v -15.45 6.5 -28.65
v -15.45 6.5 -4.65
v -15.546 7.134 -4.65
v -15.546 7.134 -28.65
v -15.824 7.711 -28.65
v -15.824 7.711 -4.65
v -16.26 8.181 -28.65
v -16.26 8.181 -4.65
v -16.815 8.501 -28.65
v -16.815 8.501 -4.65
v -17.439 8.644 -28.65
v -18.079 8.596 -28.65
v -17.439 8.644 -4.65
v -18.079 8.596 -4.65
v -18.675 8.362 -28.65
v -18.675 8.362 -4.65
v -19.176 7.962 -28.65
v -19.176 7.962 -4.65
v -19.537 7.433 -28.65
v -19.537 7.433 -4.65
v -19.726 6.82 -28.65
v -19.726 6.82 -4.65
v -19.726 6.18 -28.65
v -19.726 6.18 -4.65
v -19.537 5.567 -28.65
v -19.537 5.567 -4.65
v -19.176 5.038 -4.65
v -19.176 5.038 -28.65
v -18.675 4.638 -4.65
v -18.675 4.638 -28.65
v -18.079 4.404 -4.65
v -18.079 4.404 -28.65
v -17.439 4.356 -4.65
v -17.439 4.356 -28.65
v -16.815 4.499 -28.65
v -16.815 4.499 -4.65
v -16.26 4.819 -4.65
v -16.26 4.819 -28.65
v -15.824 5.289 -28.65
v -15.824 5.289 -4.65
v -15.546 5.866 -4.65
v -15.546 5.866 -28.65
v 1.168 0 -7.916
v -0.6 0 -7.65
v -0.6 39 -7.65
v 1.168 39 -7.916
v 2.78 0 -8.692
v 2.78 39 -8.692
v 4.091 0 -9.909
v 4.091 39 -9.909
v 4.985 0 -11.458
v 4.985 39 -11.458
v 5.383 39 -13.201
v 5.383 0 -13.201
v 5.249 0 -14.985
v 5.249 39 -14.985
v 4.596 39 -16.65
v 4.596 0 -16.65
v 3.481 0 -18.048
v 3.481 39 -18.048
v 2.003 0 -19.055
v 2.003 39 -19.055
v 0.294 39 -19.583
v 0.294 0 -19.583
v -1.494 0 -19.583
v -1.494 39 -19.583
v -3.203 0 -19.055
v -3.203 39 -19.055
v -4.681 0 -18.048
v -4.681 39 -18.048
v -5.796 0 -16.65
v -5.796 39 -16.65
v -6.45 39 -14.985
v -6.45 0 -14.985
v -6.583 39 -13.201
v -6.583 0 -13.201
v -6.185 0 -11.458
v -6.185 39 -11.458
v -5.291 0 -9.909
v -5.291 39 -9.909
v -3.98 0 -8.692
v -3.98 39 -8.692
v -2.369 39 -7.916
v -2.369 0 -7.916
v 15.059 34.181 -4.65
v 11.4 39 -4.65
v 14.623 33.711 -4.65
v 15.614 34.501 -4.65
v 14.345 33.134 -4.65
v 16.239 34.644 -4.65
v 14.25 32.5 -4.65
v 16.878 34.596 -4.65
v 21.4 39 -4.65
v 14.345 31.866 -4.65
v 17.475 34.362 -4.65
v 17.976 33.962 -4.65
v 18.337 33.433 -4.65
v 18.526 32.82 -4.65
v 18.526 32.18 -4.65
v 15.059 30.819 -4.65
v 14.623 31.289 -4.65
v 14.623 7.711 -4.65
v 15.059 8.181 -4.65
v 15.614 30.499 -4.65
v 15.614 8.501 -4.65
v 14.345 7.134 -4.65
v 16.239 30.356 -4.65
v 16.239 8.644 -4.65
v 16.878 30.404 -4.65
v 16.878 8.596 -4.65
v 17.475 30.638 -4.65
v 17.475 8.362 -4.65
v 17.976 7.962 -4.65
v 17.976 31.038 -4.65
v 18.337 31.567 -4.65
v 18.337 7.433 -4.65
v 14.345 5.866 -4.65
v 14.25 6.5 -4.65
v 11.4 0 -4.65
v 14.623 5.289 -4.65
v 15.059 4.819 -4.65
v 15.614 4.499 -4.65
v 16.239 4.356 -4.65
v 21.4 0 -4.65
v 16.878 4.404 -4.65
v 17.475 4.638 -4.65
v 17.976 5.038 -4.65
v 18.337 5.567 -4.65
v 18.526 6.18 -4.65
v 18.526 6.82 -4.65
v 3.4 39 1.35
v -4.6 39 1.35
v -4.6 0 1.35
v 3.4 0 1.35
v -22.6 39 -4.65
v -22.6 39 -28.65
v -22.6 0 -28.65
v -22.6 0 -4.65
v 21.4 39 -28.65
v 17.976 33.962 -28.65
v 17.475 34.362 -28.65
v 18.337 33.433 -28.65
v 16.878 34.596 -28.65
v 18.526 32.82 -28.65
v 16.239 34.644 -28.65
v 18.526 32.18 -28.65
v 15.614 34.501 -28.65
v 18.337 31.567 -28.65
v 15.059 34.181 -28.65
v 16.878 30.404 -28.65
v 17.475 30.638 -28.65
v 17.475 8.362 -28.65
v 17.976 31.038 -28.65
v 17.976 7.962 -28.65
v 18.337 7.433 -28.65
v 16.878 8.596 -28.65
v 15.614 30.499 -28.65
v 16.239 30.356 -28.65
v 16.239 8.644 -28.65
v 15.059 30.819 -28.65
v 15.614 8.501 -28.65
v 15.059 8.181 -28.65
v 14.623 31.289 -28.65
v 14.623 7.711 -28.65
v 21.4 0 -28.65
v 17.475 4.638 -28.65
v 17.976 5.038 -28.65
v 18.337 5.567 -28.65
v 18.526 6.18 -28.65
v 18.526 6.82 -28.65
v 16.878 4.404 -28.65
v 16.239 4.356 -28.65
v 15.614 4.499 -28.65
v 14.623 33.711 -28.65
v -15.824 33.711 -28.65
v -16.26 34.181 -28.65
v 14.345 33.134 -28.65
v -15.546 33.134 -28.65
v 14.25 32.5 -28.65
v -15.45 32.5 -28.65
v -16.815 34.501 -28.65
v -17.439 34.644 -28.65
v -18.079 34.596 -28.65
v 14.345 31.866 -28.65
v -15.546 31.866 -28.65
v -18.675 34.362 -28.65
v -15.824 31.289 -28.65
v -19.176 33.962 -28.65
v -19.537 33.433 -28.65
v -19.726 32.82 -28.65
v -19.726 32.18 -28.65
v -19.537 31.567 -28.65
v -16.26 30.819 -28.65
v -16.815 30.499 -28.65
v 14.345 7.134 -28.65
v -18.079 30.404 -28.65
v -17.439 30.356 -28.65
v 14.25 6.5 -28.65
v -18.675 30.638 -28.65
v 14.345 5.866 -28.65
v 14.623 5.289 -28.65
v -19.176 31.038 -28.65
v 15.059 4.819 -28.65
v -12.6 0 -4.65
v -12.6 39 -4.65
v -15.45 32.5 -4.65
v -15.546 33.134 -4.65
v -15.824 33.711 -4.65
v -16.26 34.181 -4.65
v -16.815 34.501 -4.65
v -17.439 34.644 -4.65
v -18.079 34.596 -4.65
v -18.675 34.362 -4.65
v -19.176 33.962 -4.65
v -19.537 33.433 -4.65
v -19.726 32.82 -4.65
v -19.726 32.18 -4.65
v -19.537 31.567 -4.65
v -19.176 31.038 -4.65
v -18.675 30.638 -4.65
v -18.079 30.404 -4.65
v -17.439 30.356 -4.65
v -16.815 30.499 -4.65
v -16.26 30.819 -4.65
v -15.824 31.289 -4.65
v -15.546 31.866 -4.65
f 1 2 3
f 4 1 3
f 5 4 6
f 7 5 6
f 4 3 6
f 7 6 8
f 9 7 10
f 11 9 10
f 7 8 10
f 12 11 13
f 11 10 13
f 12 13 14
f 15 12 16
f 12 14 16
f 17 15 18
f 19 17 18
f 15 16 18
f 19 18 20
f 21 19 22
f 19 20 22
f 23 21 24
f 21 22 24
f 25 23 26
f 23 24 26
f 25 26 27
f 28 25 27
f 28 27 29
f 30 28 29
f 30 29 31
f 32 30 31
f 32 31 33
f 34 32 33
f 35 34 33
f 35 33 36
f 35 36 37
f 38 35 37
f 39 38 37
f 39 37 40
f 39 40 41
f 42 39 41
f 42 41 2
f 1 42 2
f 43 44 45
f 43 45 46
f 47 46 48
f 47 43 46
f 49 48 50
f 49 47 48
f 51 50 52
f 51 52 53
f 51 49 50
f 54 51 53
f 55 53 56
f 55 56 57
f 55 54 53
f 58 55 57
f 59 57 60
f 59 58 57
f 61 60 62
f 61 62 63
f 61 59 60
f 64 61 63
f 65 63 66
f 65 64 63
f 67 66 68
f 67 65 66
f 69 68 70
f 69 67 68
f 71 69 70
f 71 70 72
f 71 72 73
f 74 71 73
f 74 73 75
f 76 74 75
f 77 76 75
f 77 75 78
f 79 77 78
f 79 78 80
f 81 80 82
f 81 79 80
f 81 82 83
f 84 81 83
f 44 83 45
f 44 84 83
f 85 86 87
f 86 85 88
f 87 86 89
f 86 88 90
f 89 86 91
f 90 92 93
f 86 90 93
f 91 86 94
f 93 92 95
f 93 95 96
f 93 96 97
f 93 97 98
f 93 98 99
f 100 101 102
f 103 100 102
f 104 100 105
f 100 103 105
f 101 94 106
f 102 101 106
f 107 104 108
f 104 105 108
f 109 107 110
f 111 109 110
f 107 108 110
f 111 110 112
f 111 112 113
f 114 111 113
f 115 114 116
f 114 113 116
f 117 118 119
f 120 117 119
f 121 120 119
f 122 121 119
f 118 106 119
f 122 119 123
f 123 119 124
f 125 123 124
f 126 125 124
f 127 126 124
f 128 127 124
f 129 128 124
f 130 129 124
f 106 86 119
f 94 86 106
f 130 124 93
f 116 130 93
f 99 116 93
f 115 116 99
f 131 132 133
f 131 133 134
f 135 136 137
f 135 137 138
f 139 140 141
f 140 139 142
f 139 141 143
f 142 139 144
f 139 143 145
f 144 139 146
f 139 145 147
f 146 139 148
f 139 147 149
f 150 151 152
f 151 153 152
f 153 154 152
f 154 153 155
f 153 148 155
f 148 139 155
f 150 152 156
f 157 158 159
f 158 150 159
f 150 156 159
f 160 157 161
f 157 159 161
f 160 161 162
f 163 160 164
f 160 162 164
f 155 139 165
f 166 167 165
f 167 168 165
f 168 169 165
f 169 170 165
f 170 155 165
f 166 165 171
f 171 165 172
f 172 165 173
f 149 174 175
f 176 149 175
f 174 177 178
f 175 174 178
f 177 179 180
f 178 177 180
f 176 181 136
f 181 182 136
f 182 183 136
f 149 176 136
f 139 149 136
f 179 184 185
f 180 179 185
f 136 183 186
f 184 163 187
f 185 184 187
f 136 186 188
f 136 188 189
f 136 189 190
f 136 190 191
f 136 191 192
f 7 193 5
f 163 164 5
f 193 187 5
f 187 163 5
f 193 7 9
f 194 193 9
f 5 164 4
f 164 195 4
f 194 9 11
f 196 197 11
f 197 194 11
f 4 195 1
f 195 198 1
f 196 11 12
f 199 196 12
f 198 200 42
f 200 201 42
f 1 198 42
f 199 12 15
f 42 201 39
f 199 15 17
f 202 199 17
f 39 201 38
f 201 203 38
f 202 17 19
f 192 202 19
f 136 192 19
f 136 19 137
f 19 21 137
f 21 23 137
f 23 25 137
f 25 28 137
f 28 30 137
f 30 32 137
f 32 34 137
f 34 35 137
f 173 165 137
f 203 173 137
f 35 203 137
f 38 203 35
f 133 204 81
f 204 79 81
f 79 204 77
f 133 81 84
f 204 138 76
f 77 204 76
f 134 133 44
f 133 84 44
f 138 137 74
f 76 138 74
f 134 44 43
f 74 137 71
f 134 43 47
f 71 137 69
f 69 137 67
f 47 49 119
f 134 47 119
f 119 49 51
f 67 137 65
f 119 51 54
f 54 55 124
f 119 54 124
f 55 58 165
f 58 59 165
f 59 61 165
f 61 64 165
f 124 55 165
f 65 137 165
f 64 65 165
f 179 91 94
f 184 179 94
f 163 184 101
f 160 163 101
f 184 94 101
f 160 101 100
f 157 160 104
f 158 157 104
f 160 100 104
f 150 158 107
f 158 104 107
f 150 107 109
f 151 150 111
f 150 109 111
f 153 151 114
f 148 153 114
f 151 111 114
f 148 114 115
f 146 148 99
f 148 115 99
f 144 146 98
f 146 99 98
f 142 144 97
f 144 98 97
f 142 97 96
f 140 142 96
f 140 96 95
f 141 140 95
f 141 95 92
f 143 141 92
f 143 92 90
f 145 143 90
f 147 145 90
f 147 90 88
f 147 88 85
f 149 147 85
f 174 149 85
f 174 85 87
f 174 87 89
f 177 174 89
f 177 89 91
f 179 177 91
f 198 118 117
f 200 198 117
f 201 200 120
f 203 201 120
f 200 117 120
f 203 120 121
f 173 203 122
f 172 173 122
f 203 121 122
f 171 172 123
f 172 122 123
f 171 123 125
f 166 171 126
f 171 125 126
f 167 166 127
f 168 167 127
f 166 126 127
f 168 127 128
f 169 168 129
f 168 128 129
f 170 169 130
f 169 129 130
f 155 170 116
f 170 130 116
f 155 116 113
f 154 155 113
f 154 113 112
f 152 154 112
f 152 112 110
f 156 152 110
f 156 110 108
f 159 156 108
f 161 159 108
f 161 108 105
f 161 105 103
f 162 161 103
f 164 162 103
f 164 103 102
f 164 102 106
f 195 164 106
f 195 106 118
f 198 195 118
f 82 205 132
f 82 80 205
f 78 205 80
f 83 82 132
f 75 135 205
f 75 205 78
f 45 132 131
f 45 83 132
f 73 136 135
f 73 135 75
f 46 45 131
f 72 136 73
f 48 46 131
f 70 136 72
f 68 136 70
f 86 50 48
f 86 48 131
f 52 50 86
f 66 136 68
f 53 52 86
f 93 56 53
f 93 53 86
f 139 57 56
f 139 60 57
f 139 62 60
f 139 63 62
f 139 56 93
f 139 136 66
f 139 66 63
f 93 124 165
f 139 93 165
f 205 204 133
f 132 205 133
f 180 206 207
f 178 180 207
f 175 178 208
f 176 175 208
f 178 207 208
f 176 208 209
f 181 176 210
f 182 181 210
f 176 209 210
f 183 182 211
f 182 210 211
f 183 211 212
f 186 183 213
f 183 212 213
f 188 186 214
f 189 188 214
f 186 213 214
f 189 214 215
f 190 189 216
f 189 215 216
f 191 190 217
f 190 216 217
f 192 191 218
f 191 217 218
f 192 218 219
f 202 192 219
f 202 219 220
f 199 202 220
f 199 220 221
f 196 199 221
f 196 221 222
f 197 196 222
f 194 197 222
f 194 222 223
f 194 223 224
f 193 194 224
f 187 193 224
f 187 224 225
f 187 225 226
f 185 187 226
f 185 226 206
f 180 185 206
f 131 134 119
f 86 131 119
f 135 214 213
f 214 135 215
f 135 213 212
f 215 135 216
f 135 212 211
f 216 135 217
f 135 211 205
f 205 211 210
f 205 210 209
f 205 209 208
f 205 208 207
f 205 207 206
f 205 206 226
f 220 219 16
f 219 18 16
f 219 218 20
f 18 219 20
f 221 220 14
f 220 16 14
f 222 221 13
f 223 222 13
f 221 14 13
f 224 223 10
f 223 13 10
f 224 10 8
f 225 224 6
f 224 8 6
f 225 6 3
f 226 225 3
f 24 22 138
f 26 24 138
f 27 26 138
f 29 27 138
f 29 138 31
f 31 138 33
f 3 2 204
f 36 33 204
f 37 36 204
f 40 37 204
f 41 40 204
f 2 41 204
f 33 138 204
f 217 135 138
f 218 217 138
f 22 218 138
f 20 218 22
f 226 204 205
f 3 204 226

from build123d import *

# Parameters (mm, degrees)
SKETCH1_R           = 6
BOSS_EXTRUDE1_DEPTH = 39
SKETCH2_R           = 2.15
CUT_EXTRUDE1_DEPTH  = 52.06627412


with BuildPart() as part:
    # Sketch1 → Boss-Extrude1 (new body)
    with BuildSketch(Plane(origin=(0, 0, 0), x_dir=(1, 0, 0), z_dir=(0, 1, 0))):
        Polygon((21.399903705, 28.649644043), (-22.600096295, 28.649644043), (-22.600096295, 4.649644043), (-12.600096295, 4.649644043), (-4.600096295, -1.350355957), (3.399903705, -1.350355957), (11.399903705, 4.649644043), (21.399903705, 4.649644043), align=None)
        with Locations(Location((-0.600096295, 13.649644043, 0), (0, 0, 270))):
            Circle(SKETCH1_R, mode=Mode.SUBTRACT)
    extrude(amount=BOSS_EXTRUDE1_DEPTH)

    # Sketch2 → Cut-Extrude1 (cut, through all)
    with BuildSketch(Plane.XY.offset(-4.649644043)):
        with Locations((-17.600096295, 32.5)):
            Circle(SKETCH2_R)
        with Locations((-17.600096295, 6.5)):
            Circle(SKETCH2_R)
        with Locations(Location((16.399903705, 6.5, 0), (0, 0, 180))):
            Circle(SKETCH2_R)
        with Locations(Location((16.399903705, 32.5, 0), (0, 0, 180))):
            Circle(SKETCH2_R)
    extrude(amount=-CUT_EXTRUDE1_DEPTH, mode=Mode.SUBTRACT)


solid = part.part
